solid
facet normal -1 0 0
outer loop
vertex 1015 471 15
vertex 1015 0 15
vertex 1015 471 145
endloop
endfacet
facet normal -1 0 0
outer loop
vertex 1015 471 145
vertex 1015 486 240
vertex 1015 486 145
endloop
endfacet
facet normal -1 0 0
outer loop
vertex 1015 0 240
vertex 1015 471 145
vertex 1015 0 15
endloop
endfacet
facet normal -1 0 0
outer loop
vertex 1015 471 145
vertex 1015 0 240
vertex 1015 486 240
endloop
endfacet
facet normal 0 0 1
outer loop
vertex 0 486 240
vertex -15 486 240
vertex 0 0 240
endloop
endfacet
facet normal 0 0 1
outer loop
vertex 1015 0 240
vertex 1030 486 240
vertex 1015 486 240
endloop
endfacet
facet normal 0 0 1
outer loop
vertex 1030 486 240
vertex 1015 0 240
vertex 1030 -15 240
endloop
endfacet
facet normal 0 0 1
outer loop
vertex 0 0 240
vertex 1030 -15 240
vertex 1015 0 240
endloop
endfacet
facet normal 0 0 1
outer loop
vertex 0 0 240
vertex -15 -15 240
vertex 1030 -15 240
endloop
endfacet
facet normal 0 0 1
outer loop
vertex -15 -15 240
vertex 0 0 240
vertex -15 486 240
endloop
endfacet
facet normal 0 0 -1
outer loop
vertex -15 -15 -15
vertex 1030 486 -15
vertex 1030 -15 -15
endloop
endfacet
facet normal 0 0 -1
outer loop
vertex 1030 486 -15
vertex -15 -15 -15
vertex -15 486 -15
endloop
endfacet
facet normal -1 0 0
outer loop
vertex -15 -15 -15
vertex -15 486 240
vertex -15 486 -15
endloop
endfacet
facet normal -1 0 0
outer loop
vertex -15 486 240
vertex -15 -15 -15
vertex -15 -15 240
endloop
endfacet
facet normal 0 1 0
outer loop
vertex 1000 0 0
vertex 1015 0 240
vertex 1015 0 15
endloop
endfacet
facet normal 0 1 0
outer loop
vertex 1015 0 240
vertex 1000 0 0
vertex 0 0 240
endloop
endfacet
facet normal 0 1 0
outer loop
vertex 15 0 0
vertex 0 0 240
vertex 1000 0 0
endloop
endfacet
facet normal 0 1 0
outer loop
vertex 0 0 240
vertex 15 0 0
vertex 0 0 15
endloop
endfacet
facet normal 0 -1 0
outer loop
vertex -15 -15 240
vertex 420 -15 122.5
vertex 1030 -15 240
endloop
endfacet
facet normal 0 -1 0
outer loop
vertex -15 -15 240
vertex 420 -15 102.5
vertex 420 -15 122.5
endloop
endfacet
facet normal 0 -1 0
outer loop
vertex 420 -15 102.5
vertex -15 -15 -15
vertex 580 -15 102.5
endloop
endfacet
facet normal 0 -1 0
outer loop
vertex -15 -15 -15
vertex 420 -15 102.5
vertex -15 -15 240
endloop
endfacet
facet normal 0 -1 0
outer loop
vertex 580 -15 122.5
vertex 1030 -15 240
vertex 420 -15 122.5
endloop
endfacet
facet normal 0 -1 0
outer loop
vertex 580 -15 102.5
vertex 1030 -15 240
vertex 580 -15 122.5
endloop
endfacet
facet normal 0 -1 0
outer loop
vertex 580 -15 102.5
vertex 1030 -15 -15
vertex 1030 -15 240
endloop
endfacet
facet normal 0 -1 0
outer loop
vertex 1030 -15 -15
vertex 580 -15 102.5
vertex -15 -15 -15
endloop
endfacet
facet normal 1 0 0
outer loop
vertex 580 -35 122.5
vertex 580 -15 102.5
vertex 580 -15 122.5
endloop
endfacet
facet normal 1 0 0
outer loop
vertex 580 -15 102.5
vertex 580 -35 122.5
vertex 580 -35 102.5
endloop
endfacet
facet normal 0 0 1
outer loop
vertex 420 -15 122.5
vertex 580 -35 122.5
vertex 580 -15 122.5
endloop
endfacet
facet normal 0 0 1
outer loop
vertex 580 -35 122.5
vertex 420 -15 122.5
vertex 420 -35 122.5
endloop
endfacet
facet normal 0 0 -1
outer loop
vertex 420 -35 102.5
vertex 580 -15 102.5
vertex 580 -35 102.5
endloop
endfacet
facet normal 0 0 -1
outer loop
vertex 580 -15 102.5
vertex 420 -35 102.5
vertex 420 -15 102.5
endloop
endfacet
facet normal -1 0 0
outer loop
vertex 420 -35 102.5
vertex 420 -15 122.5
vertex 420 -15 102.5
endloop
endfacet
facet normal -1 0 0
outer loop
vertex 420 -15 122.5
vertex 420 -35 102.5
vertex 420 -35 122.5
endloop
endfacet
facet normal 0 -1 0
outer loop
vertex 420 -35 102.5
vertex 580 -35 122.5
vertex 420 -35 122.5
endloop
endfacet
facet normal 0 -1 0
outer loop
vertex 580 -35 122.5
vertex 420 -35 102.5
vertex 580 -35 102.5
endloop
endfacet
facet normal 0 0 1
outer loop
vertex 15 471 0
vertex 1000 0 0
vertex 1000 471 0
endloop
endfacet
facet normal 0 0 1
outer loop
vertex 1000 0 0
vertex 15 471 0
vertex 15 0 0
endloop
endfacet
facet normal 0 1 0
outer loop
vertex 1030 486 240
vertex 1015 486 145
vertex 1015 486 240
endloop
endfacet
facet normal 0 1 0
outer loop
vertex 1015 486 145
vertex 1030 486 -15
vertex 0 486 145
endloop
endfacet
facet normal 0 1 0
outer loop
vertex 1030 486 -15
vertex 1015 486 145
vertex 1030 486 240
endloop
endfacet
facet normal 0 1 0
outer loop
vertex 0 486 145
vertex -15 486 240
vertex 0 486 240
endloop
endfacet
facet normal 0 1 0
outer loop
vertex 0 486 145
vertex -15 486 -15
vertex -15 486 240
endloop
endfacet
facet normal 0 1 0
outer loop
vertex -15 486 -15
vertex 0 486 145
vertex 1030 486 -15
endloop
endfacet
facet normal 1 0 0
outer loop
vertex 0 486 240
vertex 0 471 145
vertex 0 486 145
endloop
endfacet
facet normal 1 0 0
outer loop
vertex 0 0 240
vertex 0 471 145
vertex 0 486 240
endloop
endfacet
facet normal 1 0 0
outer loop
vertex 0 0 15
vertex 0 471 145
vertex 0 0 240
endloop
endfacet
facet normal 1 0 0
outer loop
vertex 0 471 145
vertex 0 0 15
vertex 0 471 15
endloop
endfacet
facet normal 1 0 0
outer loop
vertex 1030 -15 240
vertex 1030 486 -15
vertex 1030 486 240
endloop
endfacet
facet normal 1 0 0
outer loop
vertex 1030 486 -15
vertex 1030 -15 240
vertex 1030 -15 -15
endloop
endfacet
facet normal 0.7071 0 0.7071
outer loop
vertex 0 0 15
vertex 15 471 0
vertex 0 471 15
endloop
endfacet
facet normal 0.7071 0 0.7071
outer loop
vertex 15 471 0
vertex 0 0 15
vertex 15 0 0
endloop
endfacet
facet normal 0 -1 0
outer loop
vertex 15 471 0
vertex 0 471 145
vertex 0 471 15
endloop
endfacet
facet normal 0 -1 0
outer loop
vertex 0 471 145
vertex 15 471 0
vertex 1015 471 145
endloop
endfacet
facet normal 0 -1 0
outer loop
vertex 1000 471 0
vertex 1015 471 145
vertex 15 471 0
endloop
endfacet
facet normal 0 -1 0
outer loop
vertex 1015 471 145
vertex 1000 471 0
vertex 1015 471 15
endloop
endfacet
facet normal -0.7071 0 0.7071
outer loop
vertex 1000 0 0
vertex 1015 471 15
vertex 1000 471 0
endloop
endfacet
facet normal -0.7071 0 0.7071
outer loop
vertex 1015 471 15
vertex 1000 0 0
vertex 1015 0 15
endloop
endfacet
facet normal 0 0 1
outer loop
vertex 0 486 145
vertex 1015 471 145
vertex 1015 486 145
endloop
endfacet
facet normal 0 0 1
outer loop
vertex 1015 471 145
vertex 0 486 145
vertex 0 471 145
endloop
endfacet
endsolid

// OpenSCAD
// These are the usable inner dimension of the drawer.
function drawer_inner_depth() = 471; // millimeters
function drawer_inner_width() = 1000; // TODO measurement is missing, this is just a placeholder!
function drawer_inner_front_height() = 255;
function drawer_inner_back_height() = 160;
function drawer_inner_height() = max(drawer_inner_front_height(), drawer_inner_back_height());

function drawer_bottom_side_intrusion_width() = 15;
function drawer_bottom_side_intrusion_height() = 15; // TODO measurement is missing, this is just a placeholder!

function drawer_side_wall_thickness() = 15; // Does not matter in regards to usable space

module drawer_bottom() {
    width = drawer_inner_width() + 2* drawer_side_wall_thickness();
    height = drawer_side_wall_thickness();
    depth = drawer_inner_depth() + 2* drawer_side_wall_thickness();

    // make the innner space of the drawer aligned with coordinates [0,0,0]
    offset_x = -drawer_side_wall_thickness();
    offset_y = -drawer_side_wall_thickness();
    offset_z = -drawer_side_wall_thickness();

    translate([offset_x, offset_y, offset_z]) cube([width, depth, height]);
}

module drawer_front() {
    width = drawer_inner_width() + 2* drawer_side_wall_thickness();
    height = drawer_inner_height();
    depth = drawer_side_wall_thickness();

    offset_x = -drawer_side_wall_thickness();
    offset_y = -drawer_side_wall_thickness();
    offset_z = -drawer_side_wall_thickness();

    handle_width = 160;
    handle_depth = 20;
    handle_height = 20;

    // make the innner space of the drawer aligned with coordinates [0,0,0]
    handle_offset_x = offset_x + width / 2 - handle_width / 2;
    handle_offset_y = offset_y - handle_depth;
    handle_offset_z = offset_z + height / 2 - handle_height / 2;

    union() {
        // front panel
        translate([offset_x, offset_y, offset_z]) cube([width, depth, height]);
        translate([handle_offset_x, handle_offset_y, handle_offset_z]) {
            cube([handle_width, handle_depth, handle_height]);
        }
    }
}

module drawer_side(s = "left") {
    width = drawer_side_wall_thickness();
    height = drawer_inner_height();
    depth = drawer_inner_depth() + 2* drawer_side_wall_thickness();

    offset_y = -drawer_side_wall_thickness();
    offset_z = -drawer_side_wall_thickness();
    if (s == "right") {
        offset_x = drawer_inner_width() + drawer_side_wall_thickness();
        translate([offset_x, offset_y, offset_z]) cube([width, depth, height]);
    } else {
        offset_x = -drawer_side_wall_thickness();
        translate([offset_x, offset_y, offset_z]) cube([width, depth, height]);
    }
}

module drawer_bottom_side_intrusion_left() {
    rotate([0, -90, -90])
    linear_extrude(drawer_inner_depth())
    polygon([
        // it is a bit tricky because of the rotation
        [0, 0],
        [drawer_bottom_side_intrusion_height(), 0],
        [0, drawer_bottom_side_intrusion_width()],
    ]);
}

module drawer_bottom_side_intrusion_right() {
    translate([drawer_inner_width() + drawer_side_wall_thickness(), 0, 0])
    mirror([1, 0, 0])
    drawer_bottom_side_intrusion_left();
}



module drawer_back() {
    width = drawer_inner_width() + 2* drawer_side_wall_thickness();
    height = drawer_inner_back_height();
    depth = drawer_side_wall_thickness();

    offset_x = -drawer_side_wall_thickness();
    offset_y = drawer_inner_depth();
    offset_z = -drawer_side_wall_thickness();

    translate([offset_x, offset_y, offset_z]) cube([width, depth, height]);
}

module drawer() {
    union() {
        drawer_bottom();
        drawer_front();
        drawer_side(s = "left");
        drawer_side(s = "right");
        drawer_bottom_side_intrusion_left();
        drawer_bottom_side_intrusion_right();
        drawer_back();
    }
}

drawer();
